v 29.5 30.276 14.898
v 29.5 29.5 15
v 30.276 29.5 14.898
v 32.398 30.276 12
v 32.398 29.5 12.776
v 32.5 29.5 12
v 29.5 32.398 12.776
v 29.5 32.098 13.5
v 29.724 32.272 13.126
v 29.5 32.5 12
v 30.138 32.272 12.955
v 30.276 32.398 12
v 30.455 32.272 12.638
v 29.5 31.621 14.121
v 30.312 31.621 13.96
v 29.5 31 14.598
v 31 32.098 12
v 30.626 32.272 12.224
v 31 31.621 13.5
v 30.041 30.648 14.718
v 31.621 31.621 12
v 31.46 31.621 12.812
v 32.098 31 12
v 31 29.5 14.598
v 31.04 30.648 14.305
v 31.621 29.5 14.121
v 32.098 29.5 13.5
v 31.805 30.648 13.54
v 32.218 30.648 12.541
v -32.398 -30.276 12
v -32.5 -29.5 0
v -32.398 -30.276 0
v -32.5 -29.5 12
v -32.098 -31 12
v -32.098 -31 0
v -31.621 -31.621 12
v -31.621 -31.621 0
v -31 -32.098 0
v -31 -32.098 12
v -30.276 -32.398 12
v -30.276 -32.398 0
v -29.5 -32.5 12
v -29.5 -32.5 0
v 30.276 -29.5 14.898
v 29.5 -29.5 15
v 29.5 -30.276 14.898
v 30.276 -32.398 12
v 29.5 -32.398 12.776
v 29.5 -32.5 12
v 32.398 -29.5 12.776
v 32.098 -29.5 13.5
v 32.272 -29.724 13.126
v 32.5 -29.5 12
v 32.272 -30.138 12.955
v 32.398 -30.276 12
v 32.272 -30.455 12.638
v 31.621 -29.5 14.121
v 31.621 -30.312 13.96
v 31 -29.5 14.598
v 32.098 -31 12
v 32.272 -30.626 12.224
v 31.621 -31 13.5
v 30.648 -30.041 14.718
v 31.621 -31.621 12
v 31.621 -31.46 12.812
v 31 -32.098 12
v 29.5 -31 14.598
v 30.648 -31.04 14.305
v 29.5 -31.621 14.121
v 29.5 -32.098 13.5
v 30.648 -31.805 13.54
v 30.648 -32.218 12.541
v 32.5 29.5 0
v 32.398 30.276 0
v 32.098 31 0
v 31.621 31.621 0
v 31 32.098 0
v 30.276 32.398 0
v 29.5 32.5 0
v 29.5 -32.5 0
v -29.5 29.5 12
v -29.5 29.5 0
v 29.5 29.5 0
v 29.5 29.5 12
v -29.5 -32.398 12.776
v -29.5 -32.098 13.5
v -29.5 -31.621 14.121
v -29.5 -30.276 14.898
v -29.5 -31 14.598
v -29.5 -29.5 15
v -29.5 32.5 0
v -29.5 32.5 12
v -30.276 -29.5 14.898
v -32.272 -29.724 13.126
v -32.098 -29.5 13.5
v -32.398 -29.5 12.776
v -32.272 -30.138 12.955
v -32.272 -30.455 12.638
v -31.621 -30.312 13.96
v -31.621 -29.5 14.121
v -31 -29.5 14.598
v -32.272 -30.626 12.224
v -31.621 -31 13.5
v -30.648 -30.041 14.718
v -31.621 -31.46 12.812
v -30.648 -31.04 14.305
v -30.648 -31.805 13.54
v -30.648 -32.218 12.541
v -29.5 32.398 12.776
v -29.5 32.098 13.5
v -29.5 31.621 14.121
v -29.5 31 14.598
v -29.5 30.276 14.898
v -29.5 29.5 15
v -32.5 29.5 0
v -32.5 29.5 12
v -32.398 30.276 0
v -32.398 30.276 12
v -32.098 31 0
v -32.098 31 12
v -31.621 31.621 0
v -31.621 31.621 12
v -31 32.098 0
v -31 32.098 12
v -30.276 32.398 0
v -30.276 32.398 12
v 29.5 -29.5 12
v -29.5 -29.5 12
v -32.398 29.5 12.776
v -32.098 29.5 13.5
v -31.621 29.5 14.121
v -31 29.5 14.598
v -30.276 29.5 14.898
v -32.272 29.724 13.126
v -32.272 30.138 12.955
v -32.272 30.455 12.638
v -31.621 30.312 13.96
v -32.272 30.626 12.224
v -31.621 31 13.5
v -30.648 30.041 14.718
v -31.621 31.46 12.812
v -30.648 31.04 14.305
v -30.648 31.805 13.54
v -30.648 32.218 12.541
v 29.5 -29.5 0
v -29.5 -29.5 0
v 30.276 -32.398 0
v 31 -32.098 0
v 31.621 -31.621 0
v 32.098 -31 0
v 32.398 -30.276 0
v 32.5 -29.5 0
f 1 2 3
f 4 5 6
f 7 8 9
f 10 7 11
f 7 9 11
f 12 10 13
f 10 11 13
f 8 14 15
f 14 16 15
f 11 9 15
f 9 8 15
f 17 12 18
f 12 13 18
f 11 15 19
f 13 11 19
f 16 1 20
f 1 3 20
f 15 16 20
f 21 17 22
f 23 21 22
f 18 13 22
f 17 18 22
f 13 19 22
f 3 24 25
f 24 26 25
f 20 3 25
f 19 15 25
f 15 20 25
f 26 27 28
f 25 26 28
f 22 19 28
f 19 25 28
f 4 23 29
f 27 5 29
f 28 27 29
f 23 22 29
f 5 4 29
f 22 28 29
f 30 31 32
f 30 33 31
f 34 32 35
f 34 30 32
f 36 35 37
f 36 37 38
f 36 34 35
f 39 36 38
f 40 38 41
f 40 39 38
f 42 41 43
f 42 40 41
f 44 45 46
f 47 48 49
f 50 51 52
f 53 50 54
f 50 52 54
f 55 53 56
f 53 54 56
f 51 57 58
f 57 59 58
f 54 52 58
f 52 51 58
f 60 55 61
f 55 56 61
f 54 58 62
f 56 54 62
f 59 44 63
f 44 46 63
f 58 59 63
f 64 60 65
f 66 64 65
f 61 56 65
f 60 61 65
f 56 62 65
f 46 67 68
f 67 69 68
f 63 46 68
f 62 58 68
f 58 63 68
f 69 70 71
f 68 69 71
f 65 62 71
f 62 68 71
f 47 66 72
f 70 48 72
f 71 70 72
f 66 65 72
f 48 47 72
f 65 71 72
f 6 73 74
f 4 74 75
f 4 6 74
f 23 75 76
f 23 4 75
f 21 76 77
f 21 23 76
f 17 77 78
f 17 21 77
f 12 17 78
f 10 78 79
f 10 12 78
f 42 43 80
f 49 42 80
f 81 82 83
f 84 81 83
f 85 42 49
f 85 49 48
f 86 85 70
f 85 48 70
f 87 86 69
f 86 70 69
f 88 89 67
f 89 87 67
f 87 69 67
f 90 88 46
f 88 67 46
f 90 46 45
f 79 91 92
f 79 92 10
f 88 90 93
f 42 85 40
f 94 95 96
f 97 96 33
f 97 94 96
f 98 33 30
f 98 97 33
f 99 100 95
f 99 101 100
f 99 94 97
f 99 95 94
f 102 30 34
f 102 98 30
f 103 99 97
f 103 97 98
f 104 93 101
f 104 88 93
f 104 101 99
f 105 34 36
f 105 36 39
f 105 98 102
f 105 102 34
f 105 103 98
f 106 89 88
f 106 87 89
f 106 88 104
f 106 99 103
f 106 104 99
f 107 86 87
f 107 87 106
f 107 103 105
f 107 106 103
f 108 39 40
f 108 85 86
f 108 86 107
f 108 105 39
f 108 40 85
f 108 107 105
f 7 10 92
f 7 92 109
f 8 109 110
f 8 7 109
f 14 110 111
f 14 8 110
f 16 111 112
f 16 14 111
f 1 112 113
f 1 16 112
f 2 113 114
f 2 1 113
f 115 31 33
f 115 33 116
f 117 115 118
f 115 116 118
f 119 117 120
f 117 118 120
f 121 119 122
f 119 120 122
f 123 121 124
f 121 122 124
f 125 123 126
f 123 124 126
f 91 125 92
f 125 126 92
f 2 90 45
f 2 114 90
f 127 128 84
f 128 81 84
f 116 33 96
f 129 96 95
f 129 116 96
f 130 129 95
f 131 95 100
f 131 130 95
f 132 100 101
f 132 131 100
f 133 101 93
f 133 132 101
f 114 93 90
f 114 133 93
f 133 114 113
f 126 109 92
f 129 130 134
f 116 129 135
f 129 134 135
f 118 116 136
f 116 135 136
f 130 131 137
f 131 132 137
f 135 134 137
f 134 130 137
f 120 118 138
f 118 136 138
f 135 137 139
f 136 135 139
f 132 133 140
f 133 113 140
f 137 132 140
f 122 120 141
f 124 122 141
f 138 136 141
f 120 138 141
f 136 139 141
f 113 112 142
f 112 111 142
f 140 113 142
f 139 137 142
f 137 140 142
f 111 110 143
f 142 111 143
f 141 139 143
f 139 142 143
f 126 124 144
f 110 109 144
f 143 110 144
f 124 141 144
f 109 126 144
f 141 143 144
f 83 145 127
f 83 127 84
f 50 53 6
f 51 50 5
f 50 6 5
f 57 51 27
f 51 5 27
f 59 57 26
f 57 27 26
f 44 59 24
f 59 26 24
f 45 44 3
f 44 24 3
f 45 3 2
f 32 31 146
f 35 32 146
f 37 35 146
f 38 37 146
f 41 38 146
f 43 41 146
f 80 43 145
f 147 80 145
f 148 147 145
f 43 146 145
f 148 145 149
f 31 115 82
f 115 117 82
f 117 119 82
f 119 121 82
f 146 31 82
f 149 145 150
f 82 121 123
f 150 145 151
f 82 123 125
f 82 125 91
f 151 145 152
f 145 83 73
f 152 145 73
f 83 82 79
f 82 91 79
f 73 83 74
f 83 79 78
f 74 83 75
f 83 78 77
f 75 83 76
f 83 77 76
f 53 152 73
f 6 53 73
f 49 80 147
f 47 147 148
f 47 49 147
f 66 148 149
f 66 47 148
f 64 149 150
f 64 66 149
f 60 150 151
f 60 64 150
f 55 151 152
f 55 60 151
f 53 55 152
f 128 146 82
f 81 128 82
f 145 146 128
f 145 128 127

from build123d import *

# Parameters (mm, degrees)
F0_W     = 65
F0_H     = 65
F1_DEPTH = 15
F2_R     = 3
F3_T     = 3


# Not quite as in the source:
# - a shell that OpenCascade refuses in one call is made with other operations: the cavity is built on its own and cut out


with BuildPart() as f1:
    # F0 (on Top) → F1 (new body)
    with BuildSketch(Plane.XY):
        Rectangle(F0_W, F0_H)
    extrude(amount=F1_DEPTH)

    # F2
    f2_edges = [f1.edges().sort_by_distance(p)[0] for p in [
        (0, -32.5, 15),
        (32.5, 0, 15),
        (0, 32.5, 15),
        (-32.5, 0, 15),
        (-32.5, 32.5, 7.5),
        (-32.5, -32.5, 7.5),
        (32.5, 32.5, 7.5),
        (32.5, -32.5, 7.5),
    ]]
    fillet(f2_edges, radius=F2_R)

    # F3: shell of thickness 3, made by hand


with BuildPart() as f3_core1:
    # F3_t2: copy of F1
    add(f1.part)

    # the walls: a layer under each face that stays
    f3_faces = [f3_core1.faces().sort_by_distance(p)[0] for p in [
        (0, -32.5, 6),
        (-32.5, 0, 6),
        (32.5, 0, 6),
        (0, 32.5, 6),
        (0, 0, 15),
    ]]
    thicken(f3_faces, amount=-F3_T, mode=Mode.SUBTRACT)


with BuildPart() as f1_1:
    add(f1.part)

    # what is left inside the walls is the cavity
    f3_cavity = [f3_core1.part.solids().sort_by_distance(p)[0] for p in [
        (0, -9.833333, 0.03),
    ]]
    add(f3_cavity, mode=Mode.SUBTRACT)


solid = f1_1.part
